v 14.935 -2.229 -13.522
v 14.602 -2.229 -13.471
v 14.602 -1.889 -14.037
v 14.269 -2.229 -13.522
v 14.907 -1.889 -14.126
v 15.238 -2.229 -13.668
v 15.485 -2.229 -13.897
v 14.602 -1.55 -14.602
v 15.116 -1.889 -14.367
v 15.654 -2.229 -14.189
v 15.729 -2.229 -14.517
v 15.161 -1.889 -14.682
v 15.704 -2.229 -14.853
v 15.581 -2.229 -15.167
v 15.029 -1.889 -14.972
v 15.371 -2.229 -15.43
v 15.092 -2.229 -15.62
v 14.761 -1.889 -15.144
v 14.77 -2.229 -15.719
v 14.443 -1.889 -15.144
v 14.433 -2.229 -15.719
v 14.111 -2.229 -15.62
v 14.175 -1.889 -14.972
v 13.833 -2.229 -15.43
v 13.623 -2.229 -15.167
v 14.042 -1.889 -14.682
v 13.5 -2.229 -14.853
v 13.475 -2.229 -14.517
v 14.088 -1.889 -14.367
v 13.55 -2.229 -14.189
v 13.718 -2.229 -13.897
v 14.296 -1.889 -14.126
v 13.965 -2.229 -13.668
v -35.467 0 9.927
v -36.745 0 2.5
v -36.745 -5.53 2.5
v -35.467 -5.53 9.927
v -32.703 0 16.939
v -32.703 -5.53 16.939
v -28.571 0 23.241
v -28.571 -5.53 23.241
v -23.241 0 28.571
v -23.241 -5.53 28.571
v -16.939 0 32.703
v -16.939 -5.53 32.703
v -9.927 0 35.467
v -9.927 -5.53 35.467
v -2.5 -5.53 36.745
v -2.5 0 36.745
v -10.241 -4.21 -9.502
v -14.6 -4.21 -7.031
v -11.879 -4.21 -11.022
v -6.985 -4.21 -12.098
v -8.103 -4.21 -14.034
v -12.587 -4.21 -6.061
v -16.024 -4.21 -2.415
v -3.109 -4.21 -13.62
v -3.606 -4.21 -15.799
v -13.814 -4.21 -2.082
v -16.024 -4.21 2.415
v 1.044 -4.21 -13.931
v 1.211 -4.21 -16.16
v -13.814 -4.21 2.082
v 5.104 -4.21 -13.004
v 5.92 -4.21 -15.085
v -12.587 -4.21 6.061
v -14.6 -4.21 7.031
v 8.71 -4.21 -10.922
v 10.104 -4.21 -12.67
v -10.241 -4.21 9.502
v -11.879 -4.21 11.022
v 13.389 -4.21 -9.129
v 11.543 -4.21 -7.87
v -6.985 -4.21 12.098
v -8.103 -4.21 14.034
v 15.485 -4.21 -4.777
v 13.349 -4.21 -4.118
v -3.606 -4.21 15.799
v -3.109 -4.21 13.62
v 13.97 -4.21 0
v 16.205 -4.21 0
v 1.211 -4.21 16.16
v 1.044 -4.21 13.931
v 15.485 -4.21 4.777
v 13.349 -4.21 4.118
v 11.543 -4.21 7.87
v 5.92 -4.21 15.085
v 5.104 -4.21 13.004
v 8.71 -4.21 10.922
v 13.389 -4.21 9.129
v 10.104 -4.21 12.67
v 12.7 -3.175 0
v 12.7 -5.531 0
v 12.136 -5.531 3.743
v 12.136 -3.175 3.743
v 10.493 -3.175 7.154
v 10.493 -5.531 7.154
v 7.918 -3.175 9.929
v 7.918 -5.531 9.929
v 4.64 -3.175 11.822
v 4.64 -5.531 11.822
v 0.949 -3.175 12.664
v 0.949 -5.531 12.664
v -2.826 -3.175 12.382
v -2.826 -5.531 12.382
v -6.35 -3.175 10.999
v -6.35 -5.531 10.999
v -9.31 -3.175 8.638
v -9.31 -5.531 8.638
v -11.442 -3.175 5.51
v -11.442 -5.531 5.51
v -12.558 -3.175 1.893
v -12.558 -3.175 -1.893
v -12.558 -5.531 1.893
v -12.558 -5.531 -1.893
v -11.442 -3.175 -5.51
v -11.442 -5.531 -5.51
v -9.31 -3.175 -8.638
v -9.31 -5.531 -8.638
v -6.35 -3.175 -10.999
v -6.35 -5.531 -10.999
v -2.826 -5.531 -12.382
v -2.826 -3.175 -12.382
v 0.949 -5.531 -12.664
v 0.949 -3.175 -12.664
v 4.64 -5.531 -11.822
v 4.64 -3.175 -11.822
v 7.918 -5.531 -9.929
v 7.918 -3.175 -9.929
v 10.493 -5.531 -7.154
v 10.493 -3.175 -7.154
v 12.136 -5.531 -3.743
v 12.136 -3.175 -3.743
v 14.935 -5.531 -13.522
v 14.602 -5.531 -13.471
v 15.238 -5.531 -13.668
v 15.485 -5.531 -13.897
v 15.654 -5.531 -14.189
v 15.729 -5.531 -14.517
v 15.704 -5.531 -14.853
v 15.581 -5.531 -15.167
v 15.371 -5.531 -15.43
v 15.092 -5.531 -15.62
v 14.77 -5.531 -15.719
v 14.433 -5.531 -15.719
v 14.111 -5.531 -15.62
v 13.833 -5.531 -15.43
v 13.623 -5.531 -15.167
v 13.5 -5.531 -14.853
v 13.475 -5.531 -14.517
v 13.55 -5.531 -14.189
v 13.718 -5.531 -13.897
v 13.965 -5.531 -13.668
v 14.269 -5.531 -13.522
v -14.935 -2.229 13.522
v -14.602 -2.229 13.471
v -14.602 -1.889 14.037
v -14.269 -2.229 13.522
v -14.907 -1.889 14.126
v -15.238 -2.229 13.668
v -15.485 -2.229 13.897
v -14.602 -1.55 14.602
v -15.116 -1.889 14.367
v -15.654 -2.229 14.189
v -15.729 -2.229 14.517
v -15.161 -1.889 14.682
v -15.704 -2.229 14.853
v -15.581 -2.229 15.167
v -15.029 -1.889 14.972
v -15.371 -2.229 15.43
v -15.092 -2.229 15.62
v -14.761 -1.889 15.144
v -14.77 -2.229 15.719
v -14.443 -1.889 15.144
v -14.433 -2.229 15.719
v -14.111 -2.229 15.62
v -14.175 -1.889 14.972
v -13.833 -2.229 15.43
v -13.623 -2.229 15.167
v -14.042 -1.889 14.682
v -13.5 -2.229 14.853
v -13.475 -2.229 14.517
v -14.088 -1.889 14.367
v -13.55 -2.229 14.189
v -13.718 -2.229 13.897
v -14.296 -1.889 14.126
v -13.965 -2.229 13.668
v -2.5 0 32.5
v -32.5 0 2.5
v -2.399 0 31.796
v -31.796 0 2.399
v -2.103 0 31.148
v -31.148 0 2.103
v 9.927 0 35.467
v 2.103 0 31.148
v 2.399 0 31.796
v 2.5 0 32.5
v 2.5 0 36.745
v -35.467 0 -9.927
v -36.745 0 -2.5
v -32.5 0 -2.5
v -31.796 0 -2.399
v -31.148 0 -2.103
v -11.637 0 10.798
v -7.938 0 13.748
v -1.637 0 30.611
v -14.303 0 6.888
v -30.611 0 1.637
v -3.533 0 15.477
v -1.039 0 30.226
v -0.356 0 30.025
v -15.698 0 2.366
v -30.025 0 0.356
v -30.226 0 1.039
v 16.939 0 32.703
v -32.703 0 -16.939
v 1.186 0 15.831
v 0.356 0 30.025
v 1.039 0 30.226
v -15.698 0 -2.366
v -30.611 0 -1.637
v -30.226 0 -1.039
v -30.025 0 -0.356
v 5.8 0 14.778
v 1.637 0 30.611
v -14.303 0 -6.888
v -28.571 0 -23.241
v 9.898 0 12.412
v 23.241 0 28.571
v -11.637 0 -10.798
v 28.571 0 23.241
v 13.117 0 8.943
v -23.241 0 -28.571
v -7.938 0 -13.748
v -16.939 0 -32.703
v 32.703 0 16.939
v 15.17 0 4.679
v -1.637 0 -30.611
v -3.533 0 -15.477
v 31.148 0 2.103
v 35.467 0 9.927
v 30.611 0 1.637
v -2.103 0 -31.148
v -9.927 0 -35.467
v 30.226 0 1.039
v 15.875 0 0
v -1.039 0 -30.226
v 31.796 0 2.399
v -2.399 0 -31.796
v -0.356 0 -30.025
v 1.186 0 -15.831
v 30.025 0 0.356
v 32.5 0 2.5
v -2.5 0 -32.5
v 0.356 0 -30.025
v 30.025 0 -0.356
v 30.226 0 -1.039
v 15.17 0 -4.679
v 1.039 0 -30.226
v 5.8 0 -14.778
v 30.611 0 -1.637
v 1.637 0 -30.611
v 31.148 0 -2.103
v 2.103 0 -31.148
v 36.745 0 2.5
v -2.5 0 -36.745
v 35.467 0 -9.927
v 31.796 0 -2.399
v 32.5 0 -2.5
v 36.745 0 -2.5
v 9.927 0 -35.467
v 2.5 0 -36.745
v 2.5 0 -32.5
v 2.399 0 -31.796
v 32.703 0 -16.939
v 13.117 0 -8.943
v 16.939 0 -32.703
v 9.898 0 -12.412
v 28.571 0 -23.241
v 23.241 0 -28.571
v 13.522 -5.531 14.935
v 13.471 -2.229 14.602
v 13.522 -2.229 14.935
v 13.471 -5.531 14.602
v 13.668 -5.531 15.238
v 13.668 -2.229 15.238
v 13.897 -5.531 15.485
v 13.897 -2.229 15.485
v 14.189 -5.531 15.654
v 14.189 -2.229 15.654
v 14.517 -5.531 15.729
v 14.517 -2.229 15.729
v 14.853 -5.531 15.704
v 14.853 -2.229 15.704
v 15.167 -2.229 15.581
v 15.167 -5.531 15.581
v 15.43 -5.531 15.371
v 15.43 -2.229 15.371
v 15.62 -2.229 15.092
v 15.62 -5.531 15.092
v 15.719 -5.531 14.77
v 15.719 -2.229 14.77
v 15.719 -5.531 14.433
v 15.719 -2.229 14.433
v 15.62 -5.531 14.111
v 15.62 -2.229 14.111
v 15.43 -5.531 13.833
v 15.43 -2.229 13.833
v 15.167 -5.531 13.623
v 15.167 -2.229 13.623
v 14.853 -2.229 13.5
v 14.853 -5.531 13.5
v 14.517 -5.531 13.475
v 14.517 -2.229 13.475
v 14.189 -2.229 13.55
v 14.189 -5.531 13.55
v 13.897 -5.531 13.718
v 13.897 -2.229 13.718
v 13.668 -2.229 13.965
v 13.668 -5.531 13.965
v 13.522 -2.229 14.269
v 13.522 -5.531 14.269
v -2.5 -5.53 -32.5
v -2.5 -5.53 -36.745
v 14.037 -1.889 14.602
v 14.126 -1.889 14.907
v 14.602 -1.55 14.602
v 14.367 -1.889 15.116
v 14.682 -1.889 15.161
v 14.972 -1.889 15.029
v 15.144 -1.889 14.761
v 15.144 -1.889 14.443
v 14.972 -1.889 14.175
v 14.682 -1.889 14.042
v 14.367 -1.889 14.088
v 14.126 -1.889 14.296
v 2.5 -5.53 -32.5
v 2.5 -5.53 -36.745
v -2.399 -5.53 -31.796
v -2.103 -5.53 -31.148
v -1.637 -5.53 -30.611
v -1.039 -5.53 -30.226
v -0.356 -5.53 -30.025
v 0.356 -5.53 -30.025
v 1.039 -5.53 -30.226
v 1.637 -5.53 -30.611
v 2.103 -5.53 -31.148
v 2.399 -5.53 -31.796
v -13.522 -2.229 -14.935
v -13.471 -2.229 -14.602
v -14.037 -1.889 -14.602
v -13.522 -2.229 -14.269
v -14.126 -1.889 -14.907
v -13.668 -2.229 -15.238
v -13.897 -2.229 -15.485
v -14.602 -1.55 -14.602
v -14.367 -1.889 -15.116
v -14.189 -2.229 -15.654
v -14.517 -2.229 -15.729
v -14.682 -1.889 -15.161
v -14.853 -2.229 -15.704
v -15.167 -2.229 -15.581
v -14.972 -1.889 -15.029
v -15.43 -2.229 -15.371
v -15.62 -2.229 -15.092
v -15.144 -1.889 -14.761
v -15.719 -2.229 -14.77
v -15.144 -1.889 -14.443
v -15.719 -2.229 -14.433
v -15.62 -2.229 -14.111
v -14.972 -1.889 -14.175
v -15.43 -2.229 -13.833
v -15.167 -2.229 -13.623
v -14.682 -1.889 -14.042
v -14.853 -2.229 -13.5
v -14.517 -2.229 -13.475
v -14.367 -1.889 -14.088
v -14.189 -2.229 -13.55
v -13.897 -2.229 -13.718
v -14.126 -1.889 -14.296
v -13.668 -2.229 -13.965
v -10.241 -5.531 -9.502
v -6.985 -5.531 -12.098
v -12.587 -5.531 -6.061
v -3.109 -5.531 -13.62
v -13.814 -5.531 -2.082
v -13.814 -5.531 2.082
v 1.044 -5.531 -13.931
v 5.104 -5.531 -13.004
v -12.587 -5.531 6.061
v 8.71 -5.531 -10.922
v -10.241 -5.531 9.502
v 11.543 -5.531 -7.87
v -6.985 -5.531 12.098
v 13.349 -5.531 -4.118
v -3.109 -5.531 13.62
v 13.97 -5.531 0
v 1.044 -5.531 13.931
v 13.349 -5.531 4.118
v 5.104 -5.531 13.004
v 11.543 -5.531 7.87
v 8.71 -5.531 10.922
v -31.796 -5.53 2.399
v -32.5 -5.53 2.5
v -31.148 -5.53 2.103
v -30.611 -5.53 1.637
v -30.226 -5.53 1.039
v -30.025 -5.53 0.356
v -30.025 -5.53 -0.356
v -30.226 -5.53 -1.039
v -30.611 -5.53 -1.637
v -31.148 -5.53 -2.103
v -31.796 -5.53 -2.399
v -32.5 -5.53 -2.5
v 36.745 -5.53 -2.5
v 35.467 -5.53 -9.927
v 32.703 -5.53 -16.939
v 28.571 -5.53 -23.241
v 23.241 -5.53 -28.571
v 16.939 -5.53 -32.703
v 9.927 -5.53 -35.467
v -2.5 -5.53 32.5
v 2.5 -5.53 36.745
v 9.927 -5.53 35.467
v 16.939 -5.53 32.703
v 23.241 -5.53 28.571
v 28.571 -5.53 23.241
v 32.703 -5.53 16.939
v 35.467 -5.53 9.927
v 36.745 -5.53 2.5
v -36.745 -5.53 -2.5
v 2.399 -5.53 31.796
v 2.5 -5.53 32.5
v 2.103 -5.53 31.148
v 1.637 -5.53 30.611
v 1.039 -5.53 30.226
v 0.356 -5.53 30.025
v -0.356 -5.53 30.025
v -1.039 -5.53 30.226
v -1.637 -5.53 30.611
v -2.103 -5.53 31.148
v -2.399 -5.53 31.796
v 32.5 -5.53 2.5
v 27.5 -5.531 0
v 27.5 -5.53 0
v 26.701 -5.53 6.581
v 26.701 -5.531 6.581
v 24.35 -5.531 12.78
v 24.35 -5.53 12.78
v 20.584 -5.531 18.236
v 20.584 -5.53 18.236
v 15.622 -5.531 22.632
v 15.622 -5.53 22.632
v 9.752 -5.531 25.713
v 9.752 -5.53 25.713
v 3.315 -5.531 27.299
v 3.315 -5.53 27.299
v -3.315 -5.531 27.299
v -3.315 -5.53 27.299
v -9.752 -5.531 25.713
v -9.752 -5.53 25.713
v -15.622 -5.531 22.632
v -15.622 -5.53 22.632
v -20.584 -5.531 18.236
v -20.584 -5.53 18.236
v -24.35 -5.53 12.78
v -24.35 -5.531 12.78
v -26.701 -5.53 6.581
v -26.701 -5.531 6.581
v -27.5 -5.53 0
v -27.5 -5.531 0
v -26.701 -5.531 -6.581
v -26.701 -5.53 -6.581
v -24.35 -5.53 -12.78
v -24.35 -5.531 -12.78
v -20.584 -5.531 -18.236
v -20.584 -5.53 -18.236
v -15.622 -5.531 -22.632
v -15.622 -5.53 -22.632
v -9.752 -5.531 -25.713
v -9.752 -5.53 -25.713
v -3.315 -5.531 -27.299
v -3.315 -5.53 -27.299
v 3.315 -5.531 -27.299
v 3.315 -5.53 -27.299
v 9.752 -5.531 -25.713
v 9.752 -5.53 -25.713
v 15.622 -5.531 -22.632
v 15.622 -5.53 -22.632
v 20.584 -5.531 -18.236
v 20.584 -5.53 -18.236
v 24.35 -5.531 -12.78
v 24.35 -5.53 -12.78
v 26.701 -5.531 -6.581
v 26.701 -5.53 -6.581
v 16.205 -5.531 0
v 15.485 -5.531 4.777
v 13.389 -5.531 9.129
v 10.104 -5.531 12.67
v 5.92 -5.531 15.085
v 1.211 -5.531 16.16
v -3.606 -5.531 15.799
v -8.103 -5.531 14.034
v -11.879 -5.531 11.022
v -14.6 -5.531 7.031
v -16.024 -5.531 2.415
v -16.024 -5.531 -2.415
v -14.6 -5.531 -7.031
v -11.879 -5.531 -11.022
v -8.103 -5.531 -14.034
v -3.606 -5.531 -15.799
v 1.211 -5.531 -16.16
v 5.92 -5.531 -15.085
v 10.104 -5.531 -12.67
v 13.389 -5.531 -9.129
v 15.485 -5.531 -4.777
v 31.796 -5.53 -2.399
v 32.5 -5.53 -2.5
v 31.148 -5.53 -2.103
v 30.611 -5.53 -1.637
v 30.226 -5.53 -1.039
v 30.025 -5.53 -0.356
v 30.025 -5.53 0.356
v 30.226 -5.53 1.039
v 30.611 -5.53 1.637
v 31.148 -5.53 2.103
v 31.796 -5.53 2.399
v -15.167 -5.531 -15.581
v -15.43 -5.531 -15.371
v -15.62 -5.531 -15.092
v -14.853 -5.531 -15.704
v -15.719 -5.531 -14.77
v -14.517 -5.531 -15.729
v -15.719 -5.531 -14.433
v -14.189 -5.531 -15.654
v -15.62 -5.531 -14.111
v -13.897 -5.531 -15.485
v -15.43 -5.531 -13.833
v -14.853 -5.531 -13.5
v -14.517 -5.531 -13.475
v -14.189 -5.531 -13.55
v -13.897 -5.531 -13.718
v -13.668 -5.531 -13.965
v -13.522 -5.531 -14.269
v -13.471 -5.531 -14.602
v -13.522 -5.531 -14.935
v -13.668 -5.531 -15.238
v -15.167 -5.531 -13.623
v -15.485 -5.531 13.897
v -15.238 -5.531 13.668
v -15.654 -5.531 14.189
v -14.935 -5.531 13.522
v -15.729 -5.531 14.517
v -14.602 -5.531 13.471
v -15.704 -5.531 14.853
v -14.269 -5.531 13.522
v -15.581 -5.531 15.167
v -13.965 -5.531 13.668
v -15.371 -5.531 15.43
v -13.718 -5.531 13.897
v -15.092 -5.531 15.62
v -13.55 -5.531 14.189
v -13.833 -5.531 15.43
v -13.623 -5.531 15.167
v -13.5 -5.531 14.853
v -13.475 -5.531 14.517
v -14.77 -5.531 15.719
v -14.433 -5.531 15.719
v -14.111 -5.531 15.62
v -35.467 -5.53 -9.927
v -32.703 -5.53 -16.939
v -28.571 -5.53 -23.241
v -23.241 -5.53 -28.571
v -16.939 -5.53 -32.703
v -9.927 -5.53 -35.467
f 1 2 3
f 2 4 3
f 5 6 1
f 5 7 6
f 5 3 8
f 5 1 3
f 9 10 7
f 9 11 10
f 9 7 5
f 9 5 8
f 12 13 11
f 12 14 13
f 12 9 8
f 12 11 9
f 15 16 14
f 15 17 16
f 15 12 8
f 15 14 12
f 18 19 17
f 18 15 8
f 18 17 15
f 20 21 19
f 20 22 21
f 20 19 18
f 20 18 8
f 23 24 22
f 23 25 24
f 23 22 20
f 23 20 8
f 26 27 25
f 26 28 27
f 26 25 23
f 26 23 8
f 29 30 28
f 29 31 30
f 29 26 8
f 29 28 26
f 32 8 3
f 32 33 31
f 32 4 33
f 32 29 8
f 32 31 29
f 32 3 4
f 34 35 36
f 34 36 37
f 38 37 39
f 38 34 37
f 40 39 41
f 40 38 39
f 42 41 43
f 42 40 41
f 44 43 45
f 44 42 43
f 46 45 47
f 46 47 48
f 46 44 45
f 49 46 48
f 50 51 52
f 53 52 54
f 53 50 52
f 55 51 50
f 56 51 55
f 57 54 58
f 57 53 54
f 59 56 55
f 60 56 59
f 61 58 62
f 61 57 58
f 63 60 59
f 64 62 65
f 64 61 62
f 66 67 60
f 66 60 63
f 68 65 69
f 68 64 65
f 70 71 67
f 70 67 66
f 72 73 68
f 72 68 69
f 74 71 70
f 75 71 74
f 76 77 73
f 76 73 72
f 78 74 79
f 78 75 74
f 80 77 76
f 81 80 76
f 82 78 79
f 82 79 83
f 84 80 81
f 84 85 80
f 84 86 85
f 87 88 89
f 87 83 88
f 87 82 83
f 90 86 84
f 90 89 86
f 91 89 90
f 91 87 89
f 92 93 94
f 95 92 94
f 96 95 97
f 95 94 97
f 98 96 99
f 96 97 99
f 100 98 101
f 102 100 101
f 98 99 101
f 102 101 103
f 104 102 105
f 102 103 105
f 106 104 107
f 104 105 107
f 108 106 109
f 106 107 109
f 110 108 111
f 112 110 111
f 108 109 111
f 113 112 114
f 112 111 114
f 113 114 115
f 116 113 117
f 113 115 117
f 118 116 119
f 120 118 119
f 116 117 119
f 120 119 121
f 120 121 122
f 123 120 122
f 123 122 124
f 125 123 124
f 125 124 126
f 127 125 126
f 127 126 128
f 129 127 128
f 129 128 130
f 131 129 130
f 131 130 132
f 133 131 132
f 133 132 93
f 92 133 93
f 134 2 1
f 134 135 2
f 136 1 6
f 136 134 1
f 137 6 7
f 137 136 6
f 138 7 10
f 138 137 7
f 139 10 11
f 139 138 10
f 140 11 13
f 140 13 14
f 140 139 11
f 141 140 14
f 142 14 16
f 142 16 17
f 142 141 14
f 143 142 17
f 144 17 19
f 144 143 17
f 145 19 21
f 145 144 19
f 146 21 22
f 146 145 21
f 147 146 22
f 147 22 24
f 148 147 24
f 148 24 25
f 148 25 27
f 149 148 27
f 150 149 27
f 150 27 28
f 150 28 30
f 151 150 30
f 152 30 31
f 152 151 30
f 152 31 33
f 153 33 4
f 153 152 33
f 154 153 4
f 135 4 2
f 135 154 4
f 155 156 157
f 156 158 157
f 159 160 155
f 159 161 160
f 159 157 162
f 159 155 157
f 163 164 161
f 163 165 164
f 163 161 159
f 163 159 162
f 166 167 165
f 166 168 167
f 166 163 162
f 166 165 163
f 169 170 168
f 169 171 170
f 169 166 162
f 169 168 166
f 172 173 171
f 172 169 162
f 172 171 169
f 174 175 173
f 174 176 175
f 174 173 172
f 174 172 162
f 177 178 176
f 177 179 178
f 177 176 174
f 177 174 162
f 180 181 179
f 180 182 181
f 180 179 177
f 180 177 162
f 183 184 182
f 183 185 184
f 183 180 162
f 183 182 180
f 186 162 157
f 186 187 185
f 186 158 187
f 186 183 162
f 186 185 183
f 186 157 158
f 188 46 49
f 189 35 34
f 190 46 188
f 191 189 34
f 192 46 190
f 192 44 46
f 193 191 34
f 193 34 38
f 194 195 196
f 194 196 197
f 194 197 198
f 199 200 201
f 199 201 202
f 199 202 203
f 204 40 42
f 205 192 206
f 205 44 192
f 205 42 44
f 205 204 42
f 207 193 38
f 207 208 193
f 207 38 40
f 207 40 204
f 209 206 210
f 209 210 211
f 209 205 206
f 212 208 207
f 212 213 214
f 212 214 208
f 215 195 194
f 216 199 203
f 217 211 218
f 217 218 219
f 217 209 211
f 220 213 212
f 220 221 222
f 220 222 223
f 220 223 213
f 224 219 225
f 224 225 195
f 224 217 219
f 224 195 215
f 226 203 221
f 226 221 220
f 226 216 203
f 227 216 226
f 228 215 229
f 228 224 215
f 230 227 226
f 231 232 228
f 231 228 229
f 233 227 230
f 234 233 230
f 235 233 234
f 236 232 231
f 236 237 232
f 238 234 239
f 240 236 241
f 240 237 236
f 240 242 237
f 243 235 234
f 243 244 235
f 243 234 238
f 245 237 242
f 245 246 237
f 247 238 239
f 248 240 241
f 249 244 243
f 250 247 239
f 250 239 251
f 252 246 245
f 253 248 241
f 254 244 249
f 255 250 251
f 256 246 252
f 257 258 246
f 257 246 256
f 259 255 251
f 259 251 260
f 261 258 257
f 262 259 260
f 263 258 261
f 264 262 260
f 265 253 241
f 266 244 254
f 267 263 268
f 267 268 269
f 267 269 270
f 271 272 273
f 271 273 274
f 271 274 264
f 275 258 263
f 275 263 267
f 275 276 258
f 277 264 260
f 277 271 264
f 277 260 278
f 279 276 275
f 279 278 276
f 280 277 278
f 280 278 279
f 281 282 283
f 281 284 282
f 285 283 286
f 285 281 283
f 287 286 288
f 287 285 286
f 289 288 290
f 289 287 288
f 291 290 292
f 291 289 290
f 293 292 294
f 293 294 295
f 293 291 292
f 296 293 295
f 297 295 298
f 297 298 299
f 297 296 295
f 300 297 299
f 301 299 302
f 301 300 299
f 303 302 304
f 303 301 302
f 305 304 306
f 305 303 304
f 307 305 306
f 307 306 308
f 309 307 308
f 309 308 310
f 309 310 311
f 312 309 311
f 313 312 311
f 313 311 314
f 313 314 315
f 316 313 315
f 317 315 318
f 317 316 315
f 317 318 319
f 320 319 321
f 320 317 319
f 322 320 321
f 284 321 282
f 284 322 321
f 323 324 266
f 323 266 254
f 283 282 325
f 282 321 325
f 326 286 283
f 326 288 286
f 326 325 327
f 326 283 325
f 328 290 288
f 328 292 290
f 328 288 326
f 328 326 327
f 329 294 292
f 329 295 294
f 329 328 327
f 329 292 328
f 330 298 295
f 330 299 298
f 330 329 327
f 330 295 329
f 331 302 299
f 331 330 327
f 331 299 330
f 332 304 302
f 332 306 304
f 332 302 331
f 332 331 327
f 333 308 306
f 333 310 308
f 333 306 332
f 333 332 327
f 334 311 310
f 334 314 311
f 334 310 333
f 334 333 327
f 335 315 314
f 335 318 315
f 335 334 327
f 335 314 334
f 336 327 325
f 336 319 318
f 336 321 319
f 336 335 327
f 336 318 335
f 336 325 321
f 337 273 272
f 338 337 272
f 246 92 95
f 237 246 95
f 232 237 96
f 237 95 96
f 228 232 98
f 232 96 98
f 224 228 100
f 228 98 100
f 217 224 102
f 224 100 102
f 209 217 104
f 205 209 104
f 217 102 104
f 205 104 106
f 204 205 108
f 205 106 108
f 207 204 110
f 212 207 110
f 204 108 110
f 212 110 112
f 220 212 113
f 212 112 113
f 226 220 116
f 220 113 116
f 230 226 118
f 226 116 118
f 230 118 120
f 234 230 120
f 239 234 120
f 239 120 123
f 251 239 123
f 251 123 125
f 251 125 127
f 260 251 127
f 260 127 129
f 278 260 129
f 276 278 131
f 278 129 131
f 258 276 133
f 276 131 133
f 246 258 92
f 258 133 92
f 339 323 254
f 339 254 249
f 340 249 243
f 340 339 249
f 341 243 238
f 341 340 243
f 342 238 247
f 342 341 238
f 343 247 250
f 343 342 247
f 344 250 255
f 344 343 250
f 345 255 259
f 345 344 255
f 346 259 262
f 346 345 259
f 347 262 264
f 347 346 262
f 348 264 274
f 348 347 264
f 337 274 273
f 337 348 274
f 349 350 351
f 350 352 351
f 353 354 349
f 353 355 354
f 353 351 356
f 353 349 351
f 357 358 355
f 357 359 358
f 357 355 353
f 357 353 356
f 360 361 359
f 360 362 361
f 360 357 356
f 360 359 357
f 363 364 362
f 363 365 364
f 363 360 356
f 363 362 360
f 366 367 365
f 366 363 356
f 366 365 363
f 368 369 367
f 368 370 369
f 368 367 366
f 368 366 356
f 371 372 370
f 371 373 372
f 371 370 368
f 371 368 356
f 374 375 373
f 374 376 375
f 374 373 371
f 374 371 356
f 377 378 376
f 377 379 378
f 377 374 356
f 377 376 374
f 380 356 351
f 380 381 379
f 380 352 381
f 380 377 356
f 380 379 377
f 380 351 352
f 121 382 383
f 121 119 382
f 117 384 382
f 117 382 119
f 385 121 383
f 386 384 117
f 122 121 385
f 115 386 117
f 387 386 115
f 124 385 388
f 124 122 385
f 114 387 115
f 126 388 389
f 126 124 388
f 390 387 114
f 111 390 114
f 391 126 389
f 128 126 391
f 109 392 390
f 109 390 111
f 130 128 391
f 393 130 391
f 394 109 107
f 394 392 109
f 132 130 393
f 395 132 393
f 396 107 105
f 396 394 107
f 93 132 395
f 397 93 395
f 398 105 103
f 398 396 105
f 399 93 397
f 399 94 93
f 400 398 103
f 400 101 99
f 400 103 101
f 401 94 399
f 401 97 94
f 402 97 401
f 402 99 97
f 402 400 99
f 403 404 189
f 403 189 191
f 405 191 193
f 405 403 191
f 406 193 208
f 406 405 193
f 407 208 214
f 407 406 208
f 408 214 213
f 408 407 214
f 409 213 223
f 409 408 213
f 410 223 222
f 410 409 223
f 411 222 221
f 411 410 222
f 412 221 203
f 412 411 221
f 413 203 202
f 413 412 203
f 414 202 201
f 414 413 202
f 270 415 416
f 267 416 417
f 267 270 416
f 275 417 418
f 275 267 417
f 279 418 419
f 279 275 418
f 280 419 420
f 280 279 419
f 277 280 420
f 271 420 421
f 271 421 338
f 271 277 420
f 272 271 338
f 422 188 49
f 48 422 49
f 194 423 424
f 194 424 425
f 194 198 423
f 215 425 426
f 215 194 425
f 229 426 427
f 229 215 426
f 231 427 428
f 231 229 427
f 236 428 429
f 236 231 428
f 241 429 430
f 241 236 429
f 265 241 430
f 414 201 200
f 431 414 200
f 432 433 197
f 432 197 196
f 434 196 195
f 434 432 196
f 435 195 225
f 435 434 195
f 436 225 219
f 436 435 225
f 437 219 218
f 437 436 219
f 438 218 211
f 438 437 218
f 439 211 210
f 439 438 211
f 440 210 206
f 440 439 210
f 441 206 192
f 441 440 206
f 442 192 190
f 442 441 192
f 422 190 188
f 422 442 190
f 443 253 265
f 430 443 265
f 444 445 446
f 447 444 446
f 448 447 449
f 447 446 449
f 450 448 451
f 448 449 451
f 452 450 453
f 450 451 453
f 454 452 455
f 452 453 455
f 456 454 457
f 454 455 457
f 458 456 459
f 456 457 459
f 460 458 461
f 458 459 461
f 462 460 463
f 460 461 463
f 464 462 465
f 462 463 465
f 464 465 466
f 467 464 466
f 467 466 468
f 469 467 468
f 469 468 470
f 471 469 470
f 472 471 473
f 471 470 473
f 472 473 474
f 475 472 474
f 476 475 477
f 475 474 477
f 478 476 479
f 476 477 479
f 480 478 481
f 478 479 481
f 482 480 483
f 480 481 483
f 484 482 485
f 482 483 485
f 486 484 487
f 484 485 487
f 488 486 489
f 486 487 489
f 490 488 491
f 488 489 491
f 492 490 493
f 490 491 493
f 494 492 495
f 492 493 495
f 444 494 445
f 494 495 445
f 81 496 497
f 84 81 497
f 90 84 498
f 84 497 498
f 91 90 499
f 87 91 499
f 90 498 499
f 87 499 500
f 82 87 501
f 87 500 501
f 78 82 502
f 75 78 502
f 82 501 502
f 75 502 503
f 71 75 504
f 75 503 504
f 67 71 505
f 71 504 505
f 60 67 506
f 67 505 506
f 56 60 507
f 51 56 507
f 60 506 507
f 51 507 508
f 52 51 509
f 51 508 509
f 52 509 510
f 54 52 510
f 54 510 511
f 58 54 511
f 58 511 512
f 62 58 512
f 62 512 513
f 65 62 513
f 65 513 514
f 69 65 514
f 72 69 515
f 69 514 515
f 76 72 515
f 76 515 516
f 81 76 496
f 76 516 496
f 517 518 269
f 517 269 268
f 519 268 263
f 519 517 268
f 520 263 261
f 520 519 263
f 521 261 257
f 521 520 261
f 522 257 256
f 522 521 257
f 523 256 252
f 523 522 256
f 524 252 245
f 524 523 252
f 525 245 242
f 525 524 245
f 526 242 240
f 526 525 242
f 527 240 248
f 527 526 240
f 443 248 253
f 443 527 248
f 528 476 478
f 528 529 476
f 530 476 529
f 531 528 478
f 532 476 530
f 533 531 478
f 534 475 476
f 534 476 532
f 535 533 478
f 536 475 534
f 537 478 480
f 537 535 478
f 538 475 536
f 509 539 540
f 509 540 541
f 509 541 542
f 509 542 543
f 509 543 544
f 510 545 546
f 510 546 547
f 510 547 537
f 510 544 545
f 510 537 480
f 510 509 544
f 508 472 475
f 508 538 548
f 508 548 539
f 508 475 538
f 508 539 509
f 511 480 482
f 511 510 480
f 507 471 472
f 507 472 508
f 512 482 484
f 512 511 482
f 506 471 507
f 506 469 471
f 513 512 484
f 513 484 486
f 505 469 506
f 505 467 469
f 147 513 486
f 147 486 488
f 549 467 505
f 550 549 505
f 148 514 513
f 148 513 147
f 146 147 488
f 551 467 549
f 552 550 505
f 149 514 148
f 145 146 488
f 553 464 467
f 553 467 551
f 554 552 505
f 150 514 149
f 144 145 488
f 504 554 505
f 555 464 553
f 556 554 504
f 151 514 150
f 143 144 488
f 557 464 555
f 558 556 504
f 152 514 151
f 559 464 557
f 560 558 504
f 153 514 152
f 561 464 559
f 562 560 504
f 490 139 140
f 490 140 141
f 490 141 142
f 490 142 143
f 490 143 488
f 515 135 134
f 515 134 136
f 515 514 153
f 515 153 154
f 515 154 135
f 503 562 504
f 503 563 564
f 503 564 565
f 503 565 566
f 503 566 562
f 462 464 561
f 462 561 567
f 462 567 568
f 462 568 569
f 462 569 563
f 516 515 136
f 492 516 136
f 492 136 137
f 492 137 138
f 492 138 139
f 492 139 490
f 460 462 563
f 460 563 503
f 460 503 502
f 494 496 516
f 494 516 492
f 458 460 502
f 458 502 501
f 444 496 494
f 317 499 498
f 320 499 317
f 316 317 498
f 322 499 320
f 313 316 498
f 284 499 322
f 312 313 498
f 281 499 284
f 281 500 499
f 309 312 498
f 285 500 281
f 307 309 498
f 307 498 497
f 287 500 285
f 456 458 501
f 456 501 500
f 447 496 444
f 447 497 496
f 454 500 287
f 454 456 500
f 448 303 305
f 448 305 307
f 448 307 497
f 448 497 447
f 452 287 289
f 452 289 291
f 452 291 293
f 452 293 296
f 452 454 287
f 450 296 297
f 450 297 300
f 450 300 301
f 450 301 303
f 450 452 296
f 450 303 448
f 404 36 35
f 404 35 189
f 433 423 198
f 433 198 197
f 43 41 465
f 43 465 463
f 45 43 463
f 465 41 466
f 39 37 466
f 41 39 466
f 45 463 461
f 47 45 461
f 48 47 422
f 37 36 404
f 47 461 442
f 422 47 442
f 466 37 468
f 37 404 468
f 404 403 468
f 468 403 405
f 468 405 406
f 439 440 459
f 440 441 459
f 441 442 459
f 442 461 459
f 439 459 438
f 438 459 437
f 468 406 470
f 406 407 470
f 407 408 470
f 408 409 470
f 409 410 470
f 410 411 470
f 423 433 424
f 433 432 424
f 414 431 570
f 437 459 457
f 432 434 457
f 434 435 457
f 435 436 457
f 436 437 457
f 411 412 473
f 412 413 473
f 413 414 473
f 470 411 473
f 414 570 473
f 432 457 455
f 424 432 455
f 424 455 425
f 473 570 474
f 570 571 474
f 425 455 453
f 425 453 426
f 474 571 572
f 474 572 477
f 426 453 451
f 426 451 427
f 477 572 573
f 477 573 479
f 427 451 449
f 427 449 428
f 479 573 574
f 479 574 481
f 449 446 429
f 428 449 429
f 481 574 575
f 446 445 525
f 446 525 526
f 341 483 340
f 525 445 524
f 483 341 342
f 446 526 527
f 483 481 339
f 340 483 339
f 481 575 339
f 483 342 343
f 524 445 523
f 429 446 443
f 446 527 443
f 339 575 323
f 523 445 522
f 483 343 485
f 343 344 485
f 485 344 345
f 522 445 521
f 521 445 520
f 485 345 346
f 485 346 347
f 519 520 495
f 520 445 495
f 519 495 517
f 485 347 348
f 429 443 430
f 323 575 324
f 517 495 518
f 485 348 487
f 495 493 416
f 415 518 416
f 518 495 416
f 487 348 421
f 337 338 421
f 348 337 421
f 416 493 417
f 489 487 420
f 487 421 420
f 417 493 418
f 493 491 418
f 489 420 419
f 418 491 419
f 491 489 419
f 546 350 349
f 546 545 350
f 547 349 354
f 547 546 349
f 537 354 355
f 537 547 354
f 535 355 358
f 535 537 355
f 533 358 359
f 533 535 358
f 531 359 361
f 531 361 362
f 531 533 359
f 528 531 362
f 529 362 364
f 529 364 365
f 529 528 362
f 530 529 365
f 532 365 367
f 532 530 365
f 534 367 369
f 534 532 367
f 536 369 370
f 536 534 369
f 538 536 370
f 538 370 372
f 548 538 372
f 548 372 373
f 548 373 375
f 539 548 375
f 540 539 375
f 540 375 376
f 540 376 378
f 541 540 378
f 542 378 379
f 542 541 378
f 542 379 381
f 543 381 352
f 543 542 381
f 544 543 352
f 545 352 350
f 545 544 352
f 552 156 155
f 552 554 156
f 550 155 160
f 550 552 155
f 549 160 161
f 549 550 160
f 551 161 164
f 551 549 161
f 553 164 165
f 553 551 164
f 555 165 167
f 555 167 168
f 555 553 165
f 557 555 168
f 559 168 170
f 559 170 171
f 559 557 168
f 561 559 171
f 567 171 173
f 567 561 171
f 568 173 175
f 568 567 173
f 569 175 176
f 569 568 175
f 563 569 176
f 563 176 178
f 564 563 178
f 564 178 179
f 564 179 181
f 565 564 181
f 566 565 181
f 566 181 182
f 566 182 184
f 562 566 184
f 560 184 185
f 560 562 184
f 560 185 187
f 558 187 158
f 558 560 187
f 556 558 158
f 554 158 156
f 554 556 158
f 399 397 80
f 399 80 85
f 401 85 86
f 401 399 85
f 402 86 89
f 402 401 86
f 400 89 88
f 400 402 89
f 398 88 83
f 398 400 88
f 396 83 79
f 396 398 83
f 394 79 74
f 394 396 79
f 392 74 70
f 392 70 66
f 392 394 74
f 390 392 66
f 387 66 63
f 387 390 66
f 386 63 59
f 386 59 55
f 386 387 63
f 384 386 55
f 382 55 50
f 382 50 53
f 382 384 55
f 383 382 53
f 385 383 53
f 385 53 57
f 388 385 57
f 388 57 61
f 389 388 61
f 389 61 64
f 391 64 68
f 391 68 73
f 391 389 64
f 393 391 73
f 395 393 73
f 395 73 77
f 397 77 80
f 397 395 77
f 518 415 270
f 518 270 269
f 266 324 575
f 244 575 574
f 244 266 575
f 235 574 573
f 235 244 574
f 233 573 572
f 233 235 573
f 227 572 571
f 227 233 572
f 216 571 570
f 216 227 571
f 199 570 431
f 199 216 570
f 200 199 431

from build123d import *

# Parameters (mm, degrees)
SKETCH1_W           = 36.83
SKETCH1_H           = 5.529791667
SKETCH5_R           = 27.5
BOSS_EXTRUDE1_DEPTH = 0.001
SKETCH19_R          = 12.7
CUT_EXTRUDE6_DEPTH  = 6.530791667
CIRPATTERN1_COUNT   = 4
CUT_EXTRUDE7_DEPTH  = 6.529791667
CIRPATTERN2_COUNT   = 4
CHAMFER1_SIZE       = 3.175
SKETCH28_R          = 16.2052
SKETCH28_R_2        = 13.97
CUT_EXTRUDE17_DEPTH = 1.3208


with BuildPart() as part:
    # Sketch1 → Revolve1 (revolve)
    with BuildSketch(Plane(origin=(0, 0, 0), x_dir=(-1, 0, 0), z_dir=(0, 0, -1))):
        with Locations((-18.415, -2.764895834)):
            Rectangle(SKETCH1_W, SKETCH1_H)
    revolve(axis=Axis((0, -5.529791667, 0), (0, 1, 0)))

    # Sketch5 → Boss-Extrude1 (add)
    with BuildSketch(Plane.XZ.offset(5.529791667)):
        Circle(SKETCH5_R)
    extrude(amount=BOSS_EXTRUDE1_DEPTH)

    # Sketch12 → #4-40 Tapped Hole1 (revolve, cut)
    with BuildSketch(Plane(origin=(-14.601755032, -5.530791667, 14.601755032), x_dir=(0, 0, -1), z_dir=(1, 0, 0))):
        Polygon((0, 0), (0, 3.981152758), (1.1303, 3.302), (1.1303, 0), align=None)
    f_4_40_tapped_hole1 = revolve(axis=Axis((-14.601755032, -11.880791667, 14.601755032), (0, 1, 0)), mode=Mode.SUBTRACT)

    # Sketch19 → Cut-Extrude6 (cut, through all)
    with BuildSketch(Plane.XZ.offset(5.530791667)):
        Circle(SKETCH19_R)
    extrude(amount=-CUT_EXTRUDE6_DEPTH, mode=Mode.SUBTRACT)

    # CirPattern1: #4-40 Tapped Hole1 ×4 about axis
    cirpattern1_axis = Axis((0, 0, 0), (0, 1, 0))
    for i in range(1, CIRPATTERN1_COUNT):
        add(f_4_40_tapped_hole1.rotate(cirpattern1_axis, i * 360 / CIRPATTERN1_COUNT), mode=Mode.SUBTRACT)

    # Sketch20 → Cut-Extrude7 (cut, through all)
    with BuildSketch(Plane(origin=(0, -5.529791667, 0), x_dir=(-1, 0, 0), z_dir=(0, -1, 0))):
        with BuildLine():
            Line((2.5, -32.5), (2.5, -42.5))
            ThreePointArc((2.5, -42.5), (0, -45), (-2.5, -42.5))
            Line((-2.5, -42.5), (-2.5, -32.5))
            ThreePointArc((-2.5, -32.5), (0, -30), (2.5, -32.5))
        make_face()
    cut_extrude7 = extrude(amount=-CUT_EXTRUDE7_DEPTH, mode=Mode.SUBTRACT)

    # CirPattern2: Cut-Extrude7 ×4 about axis
    cirpattern2_axis = Axis((0, 0, 0), (0, 1, 0))
    for i in range(1, CIRPATTERN2_COUNT):
        add(cut_extrude7.rotate(cirpattern2_axis, i * 360 / CIRPATTERN2_COUNT), mode=Mode.SUBTRACT)

    # Chamfer1
    chamfer1_edges = [part.edges().sort_by_distance(p)[0] for p in [
        (-12.7, 0, 0),
    ]]
    chamfer(chamfer1_edges, length=CHAMFER1_SIZE)

    # Sketch28 → Cut-Extrude17 (cut)
    with BuildSketch(Plane.XZ.offset(5.530791667)):
        Circle(SKETCH28_R)
        Circle(SKETCH28_R_2, mode=Mode.SUBTRACT)
    extrude(amount=-CUT_EXTRUDE17_DEPTH, mode=Mode.SUBTRACT)


solid = part.part
